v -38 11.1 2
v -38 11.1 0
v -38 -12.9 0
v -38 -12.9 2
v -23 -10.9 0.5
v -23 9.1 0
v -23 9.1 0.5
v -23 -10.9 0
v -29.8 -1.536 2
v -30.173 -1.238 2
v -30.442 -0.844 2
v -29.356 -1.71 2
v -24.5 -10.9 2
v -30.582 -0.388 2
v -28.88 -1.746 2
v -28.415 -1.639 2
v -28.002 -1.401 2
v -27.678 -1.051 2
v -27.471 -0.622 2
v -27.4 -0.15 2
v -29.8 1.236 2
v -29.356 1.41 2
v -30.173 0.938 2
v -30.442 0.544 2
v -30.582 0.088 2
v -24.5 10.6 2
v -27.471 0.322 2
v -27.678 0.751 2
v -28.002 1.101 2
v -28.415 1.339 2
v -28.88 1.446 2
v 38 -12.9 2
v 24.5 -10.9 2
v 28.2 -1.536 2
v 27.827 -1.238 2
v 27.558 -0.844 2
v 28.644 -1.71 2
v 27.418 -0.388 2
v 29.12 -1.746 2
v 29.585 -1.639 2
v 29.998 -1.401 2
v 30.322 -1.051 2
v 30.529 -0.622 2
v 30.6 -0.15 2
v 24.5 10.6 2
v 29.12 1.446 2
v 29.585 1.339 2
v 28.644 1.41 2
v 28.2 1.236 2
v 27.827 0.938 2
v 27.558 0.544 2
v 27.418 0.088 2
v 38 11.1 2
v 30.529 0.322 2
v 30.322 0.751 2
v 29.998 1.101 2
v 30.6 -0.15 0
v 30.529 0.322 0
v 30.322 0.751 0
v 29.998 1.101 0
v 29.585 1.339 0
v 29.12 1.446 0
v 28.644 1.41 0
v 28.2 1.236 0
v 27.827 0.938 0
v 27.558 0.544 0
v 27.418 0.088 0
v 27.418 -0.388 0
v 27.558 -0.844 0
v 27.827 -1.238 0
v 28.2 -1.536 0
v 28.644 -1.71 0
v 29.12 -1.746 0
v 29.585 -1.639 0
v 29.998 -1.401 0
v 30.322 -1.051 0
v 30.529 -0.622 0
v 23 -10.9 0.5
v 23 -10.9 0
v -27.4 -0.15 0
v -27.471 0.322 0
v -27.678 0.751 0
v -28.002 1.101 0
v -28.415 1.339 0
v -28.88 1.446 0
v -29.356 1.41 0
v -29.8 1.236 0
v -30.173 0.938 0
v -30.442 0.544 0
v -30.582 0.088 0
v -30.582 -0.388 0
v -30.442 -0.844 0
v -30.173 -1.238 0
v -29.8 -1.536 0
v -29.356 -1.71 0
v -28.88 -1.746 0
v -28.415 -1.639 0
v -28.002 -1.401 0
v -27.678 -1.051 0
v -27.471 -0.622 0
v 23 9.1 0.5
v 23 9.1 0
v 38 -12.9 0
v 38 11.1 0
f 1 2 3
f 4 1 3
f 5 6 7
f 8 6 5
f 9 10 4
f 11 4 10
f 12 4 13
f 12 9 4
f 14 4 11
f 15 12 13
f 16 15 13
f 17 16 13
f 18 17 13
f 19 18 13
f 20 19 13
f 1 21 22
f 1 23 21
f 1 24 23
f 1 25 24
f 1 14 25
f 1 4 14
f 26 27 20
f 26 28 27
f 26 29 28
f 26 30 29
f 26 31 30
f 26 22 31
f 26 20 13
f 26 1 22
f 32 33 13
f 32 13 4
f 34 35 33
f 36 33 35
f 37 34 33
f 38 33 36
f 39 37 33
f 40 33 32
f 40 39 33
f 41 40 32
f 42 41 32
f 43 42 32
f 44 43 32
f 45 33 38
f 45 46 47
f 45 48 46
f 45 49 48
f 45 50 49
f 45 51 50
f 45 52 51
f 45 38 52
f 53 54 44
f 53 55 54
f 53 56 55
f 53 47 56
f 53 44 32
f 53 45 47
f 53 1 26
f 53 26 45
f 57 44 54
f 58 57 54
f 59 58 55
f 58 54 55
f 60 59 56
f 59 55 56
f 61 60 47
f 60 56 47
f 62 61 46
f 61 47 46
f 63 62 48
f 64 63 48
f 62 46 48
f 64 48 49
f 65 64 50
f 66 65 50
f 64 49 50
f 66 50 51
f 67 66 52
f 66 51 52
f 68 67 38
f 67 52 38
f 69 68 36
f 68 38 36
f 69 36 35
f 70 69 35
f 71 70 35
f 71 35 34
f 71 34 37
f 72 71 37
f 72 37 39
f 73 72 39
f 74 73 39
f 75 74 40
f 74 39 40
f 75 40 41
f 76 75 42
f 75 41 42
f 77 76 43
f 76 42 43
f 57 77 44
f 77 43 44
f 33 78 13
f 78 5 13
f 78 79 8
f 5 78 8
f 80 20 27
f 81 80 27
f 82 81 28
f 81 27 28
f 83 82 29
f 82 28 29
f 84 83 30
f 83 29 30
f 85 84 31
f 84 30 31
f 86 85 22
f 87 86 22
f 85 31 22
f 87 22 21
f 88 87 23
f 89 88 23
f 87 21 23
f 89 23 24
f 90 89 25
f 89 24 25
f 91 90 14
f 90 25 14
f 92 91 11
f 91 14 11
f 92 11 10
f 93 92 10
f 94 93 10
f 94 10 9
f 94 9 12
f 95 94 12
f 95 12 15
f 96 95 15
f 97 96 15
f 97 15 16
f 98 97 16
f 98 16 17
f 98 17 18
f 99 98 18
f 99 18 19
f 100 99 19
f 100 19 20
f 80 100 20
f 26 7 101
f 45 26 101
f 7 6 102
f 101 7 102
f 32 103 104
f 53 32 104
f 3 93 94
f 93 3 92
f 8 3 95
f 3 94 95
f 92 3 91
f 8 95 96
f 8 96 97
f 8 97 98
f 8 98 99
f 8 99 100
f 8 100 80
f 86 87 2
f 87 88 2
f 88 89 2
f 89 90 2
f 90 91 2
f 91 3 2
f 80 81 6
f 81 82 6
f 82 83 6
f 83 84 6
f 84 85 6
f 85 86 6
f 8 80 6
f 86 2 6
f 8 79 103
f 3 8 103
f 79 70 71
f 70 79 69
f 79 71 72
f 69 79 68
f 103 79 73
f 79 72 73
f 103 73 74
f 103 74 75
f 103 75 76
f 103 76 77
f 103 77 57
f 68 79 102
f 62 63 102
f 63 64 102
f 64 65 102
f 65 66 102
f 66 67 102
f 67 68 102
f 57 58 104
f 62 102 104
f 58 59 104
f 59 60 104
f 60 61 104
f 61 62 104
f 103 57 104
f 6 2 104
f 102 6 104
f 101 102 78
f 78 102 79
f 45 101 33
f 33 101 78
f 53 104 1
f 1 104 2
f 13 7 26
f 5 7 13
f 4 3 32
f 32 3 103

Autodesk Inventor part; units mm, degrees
ref_plane "YZ Plane" through (0, 0, 0) normal (1, 0, 0) x (0, 1, 0)
ref_plane "XZ Plane" through (0, 0, 0) normal (0, 1, 0) x (-1, 0, 0)
ref_plane "XY Plane" through (0, 0, 0) normal (0, 0, 1) x (1, 0, 0)
ref_plane "Arbeitsebene1" through (0, 0, 0) normal (0, 0, 1) x (1, 0, 0)
sketch "Skizze1" plane through (0, 0, 0) normal (0, 0, 1) x (1, 0, 0)
  circle A0 centre (12, 2.9) radius 1.5 projected
  circle A1 centre (-12, 2.9) radius 1.5 projected
  line L0 (38, 12.9) -> (-38, 12.9) projected
  line L1 (38, -12.9) -> (38, 12.9) projected
  line L2 (-38, -12.9) -> (38, -12.9) projected
  line L3 (-38, 12.9) -> (-38, -12.9) projected
  line L4 (-38, -12.9) -> (38, -12.9)
  line L5 (38, -12.9) -> (38, 11.1)
  line L6 (38, 11.1) -> (-38, 11.1)
  line L7 (-38, 11.1) -> (-38, -12.9)
  line L8 (-36, 9.1) -> (36, 9.1)
  line L9 (36, 9.1) -> (36, -10.9)
  line L10 (36, -10.9) -> (-36, -10.9)
  line L11 (-36, -10.9) -> (-36, 9.1)
  line L12 (-36, 9.1) -> (-23, 9.1)
  line L13 (-23, 9.1) -> (-23, -10.9)
  line L14 (-23, -10.9) -> (-36, -10.9)
  line L15 (-36, -10.9) -> (-36, 9.1)
  line L16 (36, 9.1) -> (23, 9.1)
  line L17 (23, 9.1) -> (23, -10.9)
  line L18 (23, -10.9) -> (36, -10.9)
  line L19 (36, -10.9) -> (36, 9.1)
  point P0 (-23, 9.1)
  point P1 (23, 9.1)
  dimension "d6" = 24
  dimension "d7" = 2
  dimension "d8" = 13
  dimension "d9" = 13
extrude "Extrusion1" add sketch "Skizze1" along normal blind 2 contours L1 L2 L3 L6 | L8 L13 L10 L11 | L8 L9 L10 L17
chamfer "Fasen1" distance 1.5 angle 45 3 edges at (0, 9.1, 2) (23, -0.9, 2) (-23, -0.9, 2)
sketch "Skizze2" plane through (0, 0, 2) normal (0, 0, 1) x (1, 0, 0)
  line L0 (24.5, -10.9) -> (-24.5, -10.9) projected
  line L1 (-24.5, 10.6) -> (-24.5, -10.9) projected
  line L2 (24.5, 10.6) -> (-24.5, 10.6) projected
  line L3 (24.5, -10.9) -> (24.5, 10.6) projected
  line L4 (-38, 11.1) -> (-38, -12.9) projected
  line L5 (-38, -12.9) -> (38, -12.9) projected
  line L6 (38, -12.9) -> (38, 11.1) projected
  line L7 (38, 11.1) -> (-38, 11.1) projected
  circle A0 centre (-12, 2.9) radius 1.5 projected
  circle A1 centre (-29, -0.15) radius 1.6
  circle A2 centre (29, -0.15) radius 1.6
  point P0 (0, 0)
  dimension "d10" = 3.2
  dimension "d11" = 3.2
  dimension "d12" = 9
  dimension "d13" = 9
extrude "Extrusion2" cut sketch "Skizze2" against normal blind 10 contours A1 | A2
properties part number "00_coverglass_frame"
